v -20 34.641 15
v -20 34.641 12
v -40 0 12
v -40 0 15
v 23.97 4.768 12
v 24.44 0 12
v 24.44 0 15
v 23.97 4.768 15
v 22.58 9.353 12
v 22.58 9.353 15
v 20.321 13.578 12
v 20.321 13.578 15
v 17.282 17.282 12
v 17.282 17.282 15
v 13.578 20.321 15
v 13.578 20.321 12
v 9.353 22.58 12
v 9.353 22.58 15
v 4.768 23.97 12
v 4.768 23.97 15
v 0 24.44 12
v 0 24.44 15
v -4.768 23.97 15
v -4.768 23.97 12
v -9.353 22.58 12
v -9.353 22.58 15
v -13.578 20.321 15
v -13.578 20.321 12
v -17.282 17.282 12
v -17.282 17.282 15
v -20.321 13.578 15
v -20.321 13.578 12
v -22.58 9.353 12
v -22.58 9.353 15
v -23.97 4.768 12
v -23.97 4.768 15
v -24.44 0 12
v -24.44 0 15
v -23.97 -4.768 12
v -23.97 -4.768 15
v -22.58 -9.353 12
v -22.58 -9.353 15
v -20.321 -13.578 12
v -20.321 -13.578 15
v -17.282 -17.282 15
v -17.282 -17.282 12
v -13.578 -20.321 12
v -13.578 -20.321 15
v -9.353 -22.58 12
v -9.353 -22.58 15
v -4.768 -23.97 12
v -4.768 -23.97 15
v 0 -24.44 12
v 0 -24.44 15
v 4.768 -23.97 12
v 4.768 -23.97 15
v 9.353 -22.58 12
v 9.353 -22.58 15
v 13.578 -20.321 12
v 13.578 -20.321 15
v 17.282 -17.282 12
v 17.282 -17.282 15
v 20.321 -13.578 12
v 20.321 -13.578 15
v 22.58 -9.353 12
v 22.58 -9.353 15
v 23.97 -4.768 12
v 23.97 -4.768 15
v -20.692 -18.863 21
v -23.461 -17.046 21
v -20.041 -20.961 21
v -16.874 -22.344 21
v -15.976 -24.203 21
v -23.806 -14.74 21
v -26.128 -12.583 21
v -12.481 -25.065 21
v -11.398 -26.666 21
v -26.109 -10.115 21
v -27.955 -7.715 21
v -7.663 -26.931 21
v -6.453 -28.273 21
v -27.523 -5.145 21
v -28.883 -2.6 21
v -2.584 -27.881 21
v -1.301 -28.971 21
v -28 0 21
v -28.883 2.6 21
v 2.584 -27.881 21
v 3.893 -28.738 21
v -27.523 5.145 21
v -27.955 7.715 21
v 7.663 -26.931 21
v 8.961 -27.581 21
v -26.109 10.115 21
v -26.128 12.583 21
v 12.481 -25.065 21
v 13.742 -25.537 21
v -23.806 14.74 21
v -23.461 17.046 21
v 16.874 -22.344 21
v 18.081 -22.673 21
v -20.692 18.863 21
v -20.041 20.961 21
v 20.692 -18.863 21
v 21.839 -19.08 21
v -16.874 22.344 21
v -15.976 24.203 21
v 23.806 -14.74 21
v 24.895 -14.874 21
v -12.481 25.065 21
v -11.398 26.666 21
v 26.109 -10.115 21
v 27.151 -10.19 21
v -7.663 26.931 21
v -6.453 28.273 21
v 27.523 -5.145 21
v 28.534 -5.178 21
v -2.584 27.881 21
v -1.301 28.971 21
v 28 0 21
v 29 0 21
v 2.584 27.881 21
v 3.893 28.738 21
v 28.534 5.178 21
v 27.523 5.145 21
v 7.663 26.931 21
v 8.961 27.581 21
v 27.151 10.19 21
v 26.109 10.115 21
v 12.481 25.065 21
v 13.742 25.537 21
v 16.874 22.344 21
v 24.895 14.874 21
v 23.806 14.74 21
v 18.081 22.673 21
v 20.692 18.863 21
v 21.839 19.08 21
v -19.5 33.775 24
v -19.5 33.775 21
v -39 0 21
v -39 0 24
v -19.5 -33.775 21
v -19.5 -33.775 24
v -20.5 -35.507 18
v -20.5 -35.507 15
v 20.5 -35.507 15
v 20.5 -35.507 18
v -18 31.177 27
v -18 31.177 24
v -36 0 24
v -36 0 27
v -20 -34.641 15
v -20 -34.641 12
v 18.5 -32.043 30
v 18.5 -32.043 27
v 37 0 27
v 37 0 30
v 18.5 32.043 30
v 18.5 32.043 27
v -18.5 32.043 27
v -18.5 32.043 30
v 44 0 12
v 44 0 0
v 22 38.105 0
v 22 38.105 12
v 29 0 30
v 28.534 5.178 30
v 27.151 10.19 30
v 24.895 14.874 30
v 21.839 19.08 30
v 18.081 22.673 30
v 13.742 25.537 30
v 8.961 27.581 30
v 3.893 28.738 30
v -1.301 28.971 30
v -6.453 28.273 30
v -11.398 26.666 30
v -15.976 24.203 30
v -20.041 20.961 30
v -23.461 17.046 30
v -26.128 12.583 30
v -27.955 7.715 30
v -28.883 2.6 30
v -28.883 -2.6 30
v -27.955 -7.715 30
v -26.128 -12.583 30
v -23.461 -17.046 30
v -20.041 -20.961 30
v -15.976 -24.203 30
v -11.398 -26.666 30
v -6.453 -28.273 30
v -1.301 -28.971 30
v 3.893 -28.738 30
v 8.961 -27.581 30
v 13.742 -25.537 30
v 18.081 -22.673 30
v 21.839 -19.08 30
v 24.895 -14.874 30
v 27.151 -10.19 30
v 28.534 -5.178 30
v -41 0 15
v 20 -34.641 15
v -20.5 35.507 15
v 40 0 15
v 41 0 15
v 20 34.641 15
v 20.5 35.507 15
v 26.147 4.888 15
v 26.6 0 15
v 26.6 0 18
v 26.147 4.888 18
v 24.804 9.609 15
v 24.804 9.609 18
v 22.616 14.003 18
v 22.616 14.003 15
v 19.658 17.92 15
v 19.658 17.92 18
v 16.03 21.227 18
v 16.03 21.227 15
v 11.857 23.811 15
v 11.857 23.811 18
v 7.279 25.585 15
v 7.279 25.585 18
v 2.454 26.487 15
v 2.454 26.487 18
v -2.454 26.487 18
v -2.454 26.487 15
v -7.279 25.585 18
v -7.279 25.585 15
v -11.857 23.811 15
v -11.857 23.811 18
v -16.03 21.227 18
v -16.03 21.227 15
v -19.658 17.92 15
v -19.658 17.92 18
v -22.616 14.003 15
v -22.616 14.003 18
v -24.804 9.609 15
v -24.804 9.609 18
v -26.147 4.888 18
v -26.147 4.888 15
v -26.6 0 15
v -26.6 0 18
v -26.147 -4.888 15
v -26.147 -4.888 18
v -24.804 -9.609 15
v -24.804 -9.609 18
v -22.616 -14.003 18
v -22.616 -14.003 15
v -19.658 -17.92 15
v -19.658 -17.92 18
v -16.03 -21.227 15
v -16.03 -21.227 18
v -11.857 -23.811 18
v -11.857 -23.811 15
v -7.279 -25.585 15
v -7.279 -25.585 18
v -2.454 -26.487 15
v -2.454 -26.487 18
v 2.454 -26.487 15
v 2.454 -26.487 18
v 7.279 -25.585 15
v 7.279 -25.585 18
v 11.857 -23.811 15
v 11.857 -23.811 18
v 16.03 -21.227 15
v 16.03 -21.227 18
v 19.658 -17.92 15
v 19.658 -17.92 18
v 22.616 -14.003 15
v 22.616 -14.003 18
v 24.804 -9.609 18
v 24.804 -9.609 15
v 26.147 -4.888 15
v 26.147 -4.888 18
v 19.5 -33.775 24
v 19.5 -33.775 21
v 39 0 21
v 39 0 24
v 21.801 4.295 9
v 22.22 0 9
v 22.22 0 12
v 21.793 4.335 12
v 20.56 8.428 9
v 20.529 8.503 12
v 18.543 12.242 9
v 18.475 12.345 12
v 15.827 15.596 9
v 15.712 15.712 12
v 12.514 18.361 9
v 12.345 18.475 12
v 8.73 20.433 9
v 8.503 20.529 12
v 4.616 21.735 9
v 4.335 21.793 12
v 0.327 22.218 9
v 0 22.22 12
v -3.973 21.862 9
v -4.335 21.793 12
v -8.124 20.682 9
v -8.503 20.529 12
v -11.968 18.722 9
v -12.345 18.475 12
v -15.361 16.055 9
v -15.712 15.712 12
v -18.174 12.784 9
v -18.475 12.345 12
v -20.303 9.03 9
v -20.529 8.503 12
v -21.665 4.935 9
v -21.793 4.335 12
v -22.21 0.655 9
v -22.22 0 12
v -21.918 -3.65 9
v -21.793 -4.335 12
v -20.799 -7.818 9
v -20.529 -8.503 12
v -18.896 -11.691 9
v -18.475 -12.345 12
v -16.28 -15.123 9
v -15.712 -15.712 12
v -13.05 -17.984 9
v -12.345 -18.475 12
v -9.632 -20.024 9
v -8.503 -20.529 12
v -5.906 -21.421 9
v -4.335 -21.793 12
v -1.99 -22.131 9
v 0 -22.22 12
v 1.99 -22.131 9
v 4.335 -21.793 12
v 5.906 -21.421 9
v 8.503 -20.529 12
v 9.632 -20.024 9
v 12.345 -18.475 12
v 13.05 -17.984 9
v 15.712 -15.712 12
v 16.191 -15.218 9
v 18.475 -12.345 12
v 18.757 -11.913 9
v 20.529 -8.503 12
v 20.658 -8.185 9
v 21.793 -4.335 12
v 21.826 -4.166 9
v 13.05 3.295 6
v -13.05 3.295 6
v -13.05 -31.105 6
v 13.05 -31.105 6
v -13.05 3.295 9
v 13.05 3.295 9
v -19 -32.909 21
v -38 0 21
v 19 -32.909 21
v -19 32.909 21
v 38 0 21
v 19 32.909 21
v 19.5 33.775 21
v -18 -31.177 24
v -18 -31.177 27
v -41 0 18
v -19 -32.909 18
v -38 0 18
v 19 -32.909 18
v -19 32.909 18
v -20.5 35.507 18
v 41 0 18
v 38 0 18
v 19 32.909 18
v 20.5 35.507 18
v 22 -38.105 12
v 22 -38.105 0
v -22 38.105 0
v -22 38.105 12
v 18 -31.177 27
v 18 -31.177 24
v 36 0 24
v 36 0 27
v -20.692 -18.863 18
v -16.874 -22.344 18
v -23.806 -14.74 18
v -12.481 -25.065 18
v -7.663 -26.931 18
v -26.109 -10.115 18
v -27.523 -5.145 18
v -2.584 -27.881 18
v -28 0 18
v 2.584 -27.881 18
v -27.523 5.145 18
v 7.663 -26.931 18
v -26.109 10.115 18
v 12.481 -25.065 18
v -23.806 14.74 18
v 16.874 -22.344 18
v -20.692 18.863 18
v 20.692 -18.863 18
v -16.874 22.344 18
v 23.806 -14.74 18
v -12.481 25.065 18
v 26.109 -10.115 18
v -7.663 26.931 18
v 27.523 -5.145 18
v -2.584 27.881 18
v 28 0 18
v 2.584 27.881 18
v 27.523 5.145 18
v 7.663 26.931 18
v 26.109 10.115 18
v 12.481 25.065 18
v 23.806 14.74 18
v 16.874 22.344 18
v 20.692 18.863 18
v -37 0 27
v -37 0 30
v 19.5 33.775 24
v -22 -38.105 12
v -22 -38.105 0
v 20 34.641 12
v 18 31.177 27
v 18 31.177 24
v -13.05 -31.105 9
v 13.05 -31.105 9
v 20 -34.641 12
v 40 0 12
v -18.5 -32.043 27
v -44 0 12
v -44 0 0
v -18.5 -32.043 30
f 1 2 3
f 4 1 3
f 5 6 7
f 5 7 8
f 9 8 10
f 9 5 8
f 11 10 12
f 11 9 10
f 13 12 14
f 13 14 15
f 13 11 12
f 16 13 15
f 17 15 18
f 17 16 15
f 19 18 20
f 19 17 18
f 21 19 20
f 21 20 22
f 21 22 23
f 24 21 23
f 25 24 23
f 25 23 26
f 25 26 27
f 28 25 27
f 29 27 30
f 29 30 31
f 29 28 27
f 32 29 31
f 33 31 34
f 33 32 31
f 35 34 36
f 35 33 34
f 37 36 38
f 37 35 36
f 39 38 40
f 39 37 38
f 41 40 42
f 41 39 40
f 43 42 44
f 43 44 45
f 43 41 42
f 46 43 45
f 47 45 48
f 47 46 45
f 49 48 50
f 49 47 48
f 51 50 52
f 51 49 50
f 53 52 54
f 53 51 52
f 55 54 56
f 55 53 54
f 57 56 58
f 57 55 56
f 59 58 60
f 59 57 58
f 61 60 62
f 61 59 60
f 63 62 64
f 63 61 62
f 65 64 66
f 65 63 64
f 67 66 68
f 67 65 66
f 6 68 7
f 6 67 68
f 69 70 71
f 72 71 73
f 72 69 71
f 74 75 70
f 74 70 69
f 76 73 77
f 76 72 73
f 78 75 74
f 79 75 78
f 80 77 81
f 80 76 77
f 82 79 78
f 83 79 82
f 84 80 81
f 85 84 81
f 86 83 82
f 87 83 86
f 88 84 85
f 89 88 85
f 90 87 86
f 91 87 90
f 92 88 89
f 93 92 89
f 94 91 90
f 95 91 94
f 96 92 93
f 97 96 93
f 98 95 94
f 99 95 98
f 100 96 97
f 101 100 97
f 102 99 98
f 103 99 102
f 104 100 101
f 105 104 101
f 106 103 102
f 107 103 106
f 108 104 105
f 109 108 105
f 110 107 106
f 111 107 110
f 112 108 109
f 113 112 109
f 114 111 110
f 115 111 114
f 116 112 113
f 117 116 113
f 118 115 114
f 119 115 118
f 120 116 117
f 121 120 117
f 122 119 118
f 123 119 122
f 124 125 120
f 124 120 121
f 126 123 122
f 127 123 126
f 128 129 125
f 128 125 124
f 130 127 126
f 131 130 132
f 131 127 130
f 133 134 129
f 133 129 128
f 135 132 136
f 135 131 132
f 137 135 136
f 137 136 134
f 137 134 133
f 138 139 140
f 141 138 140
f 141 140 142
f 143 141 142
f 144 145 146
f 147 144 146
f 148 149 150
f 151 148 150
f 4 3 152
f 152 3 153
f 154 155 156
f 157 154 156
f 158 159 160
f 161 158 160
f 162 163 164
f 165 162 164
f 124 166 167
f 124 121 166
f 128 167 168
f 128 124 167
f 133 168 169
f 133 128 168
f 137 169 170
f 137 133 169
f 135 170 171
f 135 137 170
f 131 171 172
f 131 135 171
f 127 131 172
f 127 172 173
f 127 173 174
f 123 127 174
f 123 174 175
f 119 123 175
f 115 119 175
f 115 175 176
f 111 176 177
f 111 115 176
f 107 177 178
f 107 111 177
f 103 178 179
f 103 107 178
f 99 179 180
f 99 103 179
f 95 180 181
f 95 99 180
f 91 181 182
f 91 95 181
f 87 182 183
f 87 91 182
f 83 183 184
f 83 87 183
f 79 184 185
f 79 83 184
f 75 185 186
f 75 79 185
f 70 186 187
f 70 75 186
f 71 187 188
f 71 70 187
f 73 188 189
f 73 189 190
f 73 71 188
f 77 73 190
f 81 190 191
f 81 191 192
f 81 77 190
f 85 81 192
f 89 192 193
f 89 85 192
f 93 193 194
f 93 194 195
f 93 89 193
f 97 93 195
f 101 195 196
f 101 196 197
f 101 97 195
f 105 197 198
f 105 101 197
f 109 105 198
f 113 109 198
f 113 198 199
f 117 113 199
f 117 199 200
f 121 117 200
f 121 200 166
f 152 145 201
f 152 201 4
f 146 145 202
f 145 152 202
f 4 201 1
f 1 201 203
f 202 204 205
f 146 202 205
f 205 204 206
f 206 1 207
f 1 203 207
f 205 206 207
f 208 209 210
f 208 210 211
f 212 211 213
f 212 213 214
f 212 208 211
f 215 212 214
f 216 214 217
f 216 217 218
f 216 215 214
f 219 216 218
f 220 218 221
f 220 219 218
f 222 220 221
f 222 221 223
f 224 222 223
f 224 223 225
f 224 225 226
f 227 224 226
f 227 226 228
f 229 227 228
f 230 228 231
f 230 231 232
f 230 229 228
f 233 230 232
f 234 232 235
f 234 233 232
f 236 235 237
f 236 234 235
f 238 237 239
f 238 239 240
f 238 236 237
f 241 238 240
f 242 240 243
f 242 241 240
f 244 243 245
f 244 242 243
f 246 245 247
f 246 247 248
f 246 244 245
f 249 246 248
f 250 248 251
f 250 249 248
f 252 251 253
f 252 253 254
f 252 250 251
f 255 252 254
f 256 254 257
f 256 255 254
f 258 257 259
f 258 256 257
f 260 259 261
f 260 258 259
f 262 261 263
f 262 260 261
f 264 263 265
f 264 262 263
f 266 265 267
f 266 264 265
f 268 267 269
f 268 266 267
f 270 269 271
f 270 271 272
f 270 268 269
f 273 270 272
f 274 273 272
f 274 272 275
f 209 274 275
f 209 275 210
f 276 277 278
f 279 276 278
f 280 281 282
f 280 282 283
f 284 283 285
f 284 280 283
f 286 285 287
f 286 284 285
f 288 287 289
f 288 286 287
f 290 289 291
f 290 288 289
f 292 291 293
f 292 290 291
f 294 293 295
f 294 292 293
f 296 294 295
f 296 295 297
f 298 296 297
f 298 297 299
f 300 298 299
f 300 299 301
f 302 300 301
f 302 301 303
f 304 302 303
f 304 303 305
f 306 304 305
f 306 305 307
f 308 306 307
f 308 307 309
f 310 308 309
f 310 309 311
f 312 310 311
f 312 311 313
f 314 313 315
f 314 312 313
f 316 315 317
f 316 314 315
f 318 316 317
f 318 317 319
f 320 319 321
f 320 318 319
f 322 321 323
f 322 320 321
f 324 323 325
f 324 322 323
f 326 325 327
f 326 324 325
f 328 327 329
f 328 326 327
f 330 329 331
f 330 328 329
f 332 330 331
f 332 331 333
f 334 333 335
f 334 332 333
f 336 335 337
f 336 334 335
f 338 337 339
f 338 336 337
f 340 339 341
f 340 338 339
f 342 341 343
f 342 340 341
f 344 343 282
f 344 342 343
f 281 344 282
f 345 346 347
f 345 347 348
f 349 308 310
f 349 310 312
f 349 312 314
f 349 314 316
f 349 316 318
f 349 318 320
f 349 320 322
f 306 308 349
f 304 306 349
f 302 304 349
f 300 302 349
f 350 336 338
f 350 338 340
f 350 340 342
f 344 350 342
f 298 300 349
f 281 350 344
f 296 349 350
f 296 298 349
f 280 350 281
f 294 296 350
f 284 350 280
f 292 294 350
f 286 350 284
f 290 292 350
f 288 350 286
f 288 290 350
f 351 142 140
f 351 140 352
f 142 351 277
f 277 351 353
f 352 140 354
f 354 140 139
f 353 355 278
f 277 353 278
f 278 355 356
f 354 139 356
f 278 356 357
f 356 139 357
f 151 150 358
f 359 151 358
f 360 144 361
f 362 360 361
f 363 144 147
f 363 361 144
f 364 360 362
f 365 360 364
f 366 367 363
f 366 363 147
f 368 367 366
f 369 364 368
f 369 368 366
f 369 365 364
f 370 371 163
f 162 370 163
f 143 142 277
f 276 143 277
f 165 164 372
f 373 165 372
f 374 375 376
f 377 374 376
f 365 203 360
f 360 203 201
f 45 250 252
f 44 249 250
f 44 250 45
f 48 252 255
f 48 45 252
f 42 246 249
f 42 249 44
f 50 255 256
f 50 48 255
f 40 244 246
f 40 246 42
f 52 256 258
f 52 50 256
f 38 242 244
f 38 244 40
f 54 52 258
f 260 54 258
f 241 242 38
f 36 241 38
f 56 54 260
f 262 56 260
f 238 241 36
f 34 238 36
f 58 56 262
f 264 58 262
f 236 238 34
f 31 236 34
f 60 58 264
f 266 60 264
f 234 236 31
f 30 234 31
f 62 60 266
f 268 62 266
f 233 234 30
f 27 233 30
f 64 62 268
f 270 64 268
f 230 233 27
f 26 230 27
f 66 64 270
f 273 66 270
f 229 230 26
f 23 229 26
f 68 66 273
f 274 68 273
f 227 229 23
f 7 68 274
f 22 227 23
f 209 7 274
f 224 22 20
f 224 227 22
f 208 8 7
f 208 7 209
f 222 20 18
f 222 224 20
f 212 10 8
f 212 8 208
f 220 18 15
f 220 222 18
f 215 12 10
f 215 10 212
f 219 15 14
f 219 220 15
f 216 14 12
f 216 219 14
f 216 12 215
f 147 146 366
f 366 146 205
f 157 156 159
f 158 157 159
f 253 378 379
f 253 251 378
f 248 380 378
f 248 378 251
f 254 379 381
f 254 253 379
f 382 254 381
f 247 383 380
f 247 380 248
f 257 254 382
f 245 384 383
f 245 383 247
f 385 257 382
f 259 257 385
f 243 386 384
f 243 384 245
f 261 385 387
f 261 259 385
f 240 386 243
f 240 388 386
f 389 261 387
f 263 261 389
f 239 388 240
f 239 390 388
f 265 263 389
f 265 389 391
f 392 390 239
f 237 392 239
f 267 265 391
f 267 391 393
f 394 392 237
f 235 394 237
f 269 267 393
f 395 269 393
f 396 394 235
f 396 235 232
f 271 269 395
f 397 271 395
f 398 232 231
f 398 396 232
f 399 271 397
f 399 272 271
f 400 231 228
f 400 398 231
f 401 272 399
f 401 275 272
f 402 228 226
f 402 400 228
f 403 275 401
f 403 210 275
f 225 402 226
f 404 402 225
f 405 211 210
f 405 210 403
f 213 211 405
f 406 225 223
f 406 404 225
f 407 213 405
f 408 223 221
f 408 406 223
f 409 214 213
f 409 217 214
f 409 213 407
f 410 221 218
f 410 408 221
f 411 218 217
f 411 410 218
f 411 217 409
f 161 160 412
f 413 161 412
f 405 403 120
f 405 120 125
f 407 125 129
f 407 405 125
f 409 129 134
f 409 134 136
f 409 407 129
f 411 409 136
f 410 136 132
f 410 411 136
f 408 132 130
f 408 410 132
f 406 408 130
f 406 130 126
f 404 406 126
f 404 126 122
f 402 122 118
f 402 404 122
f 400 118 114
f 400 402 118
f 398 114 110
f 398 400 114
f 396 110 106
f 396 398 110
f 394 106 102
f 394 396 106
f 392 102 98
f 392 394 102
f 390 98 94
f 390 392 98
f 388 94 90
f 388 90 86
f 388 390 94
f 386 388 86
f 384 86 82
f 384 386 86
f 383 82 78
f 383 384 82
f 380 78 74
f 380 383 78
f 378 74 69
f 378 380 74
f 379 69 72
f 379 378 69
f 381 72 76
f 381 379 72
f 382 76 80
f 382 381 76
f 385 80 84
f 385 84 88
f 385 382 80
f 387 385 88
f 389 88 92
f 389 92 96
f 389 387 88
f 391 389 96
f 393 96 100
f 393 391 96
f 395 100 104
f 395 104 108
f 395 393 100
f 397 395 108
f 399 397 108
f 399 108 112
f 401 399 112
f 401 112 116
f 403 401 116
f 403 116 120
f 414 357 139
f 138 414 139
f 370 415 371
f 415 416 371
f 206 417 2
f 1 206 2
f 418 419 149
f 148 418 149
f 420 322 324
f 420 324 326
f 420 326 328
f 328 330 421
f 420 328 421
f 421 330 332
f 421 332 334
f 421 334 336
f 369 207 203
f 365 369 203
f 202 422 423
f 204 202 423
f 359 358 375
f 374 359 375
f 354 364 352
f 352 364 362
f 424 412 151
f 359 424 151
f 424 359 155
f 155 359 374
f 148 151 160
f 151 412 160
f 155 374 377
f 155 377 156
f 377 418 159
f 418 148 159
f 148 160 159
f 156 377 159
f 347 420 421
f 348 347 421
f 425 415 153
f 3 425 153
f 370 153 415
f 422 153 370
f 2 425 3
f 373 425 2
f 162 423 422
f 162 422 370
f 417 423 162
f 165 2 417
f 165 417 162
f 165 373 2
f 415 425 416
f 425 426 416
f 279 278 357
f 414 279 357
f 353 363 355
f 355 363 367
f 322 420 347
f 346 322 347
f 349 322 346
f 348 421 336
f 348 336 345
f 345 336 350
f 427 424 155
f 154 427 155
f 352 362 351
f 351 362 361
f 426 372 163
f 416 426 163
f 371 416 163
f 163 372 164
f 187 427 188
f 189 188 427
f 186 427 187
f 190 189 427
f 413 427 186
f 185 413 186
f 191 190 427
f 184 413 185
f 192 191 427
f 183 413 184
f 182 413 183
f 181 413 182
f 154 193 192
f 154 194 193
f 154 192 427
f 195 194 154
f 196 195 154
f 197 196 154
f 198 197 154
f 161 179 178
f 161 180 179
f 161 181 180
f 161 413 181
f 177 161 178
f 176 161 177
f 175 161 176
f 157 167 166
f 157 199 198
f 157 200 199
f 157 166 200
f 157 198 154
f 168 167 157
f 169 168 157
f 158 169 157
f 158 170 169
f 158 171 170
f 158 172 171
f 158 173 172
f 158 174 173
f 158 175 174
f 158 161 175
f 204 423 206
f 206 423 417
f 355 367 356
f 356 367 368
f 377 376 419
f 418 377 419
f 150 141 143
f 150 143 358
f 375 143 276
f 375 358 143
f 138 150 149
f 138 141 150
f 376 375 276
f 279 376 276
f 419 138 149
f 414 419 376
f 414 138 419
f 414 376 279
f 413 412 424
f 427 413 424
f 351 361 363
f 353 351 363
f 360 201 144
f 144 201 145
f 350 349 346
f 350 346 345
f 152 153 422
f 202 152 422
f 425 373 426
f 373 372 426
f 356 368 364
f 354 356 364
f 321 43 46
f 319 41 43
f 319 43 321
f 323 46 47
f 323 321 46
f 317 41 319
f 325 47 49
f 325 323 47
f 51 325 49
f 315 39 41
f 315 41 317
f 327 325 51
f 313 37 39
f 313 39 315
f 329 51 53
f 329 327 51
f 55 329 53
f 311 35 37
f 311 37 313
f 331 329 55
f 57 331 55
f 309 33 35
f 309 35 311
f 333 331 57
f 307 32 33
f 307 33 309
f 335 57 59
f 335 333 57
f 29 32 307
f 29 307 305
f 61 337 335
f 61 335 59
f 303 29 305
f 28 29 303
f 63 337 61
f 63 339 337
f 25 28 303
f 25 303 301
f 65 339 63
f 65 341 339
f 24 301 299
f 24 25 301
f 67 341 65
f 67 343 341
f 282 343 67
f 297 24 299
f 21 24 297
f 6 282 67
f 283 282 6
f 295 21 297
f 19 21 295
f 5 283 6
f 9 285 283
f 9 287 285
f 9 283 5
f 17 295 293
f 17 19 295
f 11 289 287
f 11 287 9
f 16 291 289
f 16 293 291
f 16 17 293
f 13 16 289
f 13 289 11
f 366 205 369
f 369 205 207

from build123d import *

# Parameters (mm, degrees)
PAD_DEPTH    = 9
SKETCH001_W  = 26.1
SKETCH001_H  = 34.4
POCKET_DEPTH = 3
SKETCH002_R  = 22.22
PAD001_DEPTH = 3
SKETCH003_R  = 24.44
PAD002_DEPTH = 3
SKETCH004_R  = 26.6
PAD003_DEPTH = 3
SKETCH005_R  = 28
PAD004_DEPTH = 3
SKETCH006_R  = 29
PAD005_DEPTH = 3
SKETCH007_R  = 29
PAD006_DEPTH = 3
SKETCH008_R  = 29
PAD007_DEPTH = 3


with BuildPart() as part:
    # Sketch → Pad (new body)
    with BuildSketch(Plane.XY):
        Polygon((44, 0), (22, 38.105118), (-22, 38.105118), (-44, 0), (-22, -38.105118), (22, -38.105118), align=None)
    extrude(amount=PAD_DEPTH)

    # Sketch001 (on Face8 of Pad) → Pocket (cut)
    with BuildSketch(Plane.XY.offset(9)):
        with Locations((0, -13.905118)):
            Rectangle(SKETCH001_W, SKETCH001_H)
    extrude(amount=-POCKET_DEPTH, mode=Mode.SUBTRACT)

    # Sketch002 (on Face5 of Pocket) → Pad001 (join)
    with BuildSketch(Plane.XY.offset(9)):
        Polygon((22, 38.105118), (-22, 38.105118), (-44, 0), (-22, -38.105118), (22, -38.105118), (44, 0), align=None)
        Circle(SKETCH002_R, mode=Mode.SUBTRACT)
    extrude(amount=PAD001_DEPTH)

    # Sketch003 (on Face14 of Pad001) → Pad002 (join)
    with BuildSketch(Plane.XY.offset(12)):
        Polygon((40, 0), (20, 34.641016), (-20, 34.641016), (-40, 0), (-20, -34.641016), (20, -34.641016), align=None)
        Circle(SKETCH003_R, mode=Mode.SUBTRACT)
    extrude(amount=PAD002_DEPTH)

    # Sketch004 (on Face21 of Pad002) → Pad003 (join)
    with BuildSketch(Plane.XY.offset(15)):
        Polygon((41, 0), (20.5, 35.507042), (-20.5, 35.507042), (-41, 0), (-20.5, -35.507042), (20.5, -35.507042), align=None)
        Circle(SKETCH004_R, mode=Mode.SUBTRACT)
    extrude(amount=PAD003_DEPTH)

    # Sketch005 (on Face28 of Pad003) → Pad004 (join)
    with BuildSketch(Plane.XY.offset(18)):
        Polygon((19, 32.908965), (-19, 32.908965), (-38, 0), (-19, -32.908965), (19, -32.908965), (38, 0), align=None)
        Circle(SKETCH005_R, mode=Mode.SUBTRACT)
    extrude(amount=PAD004_DEPTH)

    # Sketch006 (on Face35 of Pad004) → Pad005 (join)
    with BuildSketch(Plane.XY.offset(21)):
        Polygon((39, 0), (19.5, 33.774991), (-19.5, 33.774991), (-39, 0), (-19.5, -33.774991), (19.5, -33.774991), align=None)
        Circle(SKETCH006_R, mode=Mode.SUBTRACT)
    extrude(amount=PAD005_DEPTH)

    # Sketch007 (on Face42 of Pad005) → Pad006 (join)
    with BuildSketch(Plane.XY.offset(24)):
        Polygon((36, 0), (18, 31.176915), (-18, 31.176915), (-36, 0), (-18, -31.176915), (18, -31.176915), align=None)
        Circle(SKETCH007_R, mode=Mode.SUBTRACT)
    extrude(amount=PAD006_DEPTH)

    # Sketch008 (on Face49 of Pad006) → Pad007 (join)
    with BuildSketch(Plane.XY.offset(27)):
        Polygon((37, 0), (18.5, 32.04294), (-18.5, 32.04294), (-37, 0), (-18.5, -32.04294), (18.5, -32.04294), align=None)
        Circle(SKETCH008_R, mode=Mode.SUBTRACT)
    extrude(amount=PAD007_DEPTH)


solid = part.part
